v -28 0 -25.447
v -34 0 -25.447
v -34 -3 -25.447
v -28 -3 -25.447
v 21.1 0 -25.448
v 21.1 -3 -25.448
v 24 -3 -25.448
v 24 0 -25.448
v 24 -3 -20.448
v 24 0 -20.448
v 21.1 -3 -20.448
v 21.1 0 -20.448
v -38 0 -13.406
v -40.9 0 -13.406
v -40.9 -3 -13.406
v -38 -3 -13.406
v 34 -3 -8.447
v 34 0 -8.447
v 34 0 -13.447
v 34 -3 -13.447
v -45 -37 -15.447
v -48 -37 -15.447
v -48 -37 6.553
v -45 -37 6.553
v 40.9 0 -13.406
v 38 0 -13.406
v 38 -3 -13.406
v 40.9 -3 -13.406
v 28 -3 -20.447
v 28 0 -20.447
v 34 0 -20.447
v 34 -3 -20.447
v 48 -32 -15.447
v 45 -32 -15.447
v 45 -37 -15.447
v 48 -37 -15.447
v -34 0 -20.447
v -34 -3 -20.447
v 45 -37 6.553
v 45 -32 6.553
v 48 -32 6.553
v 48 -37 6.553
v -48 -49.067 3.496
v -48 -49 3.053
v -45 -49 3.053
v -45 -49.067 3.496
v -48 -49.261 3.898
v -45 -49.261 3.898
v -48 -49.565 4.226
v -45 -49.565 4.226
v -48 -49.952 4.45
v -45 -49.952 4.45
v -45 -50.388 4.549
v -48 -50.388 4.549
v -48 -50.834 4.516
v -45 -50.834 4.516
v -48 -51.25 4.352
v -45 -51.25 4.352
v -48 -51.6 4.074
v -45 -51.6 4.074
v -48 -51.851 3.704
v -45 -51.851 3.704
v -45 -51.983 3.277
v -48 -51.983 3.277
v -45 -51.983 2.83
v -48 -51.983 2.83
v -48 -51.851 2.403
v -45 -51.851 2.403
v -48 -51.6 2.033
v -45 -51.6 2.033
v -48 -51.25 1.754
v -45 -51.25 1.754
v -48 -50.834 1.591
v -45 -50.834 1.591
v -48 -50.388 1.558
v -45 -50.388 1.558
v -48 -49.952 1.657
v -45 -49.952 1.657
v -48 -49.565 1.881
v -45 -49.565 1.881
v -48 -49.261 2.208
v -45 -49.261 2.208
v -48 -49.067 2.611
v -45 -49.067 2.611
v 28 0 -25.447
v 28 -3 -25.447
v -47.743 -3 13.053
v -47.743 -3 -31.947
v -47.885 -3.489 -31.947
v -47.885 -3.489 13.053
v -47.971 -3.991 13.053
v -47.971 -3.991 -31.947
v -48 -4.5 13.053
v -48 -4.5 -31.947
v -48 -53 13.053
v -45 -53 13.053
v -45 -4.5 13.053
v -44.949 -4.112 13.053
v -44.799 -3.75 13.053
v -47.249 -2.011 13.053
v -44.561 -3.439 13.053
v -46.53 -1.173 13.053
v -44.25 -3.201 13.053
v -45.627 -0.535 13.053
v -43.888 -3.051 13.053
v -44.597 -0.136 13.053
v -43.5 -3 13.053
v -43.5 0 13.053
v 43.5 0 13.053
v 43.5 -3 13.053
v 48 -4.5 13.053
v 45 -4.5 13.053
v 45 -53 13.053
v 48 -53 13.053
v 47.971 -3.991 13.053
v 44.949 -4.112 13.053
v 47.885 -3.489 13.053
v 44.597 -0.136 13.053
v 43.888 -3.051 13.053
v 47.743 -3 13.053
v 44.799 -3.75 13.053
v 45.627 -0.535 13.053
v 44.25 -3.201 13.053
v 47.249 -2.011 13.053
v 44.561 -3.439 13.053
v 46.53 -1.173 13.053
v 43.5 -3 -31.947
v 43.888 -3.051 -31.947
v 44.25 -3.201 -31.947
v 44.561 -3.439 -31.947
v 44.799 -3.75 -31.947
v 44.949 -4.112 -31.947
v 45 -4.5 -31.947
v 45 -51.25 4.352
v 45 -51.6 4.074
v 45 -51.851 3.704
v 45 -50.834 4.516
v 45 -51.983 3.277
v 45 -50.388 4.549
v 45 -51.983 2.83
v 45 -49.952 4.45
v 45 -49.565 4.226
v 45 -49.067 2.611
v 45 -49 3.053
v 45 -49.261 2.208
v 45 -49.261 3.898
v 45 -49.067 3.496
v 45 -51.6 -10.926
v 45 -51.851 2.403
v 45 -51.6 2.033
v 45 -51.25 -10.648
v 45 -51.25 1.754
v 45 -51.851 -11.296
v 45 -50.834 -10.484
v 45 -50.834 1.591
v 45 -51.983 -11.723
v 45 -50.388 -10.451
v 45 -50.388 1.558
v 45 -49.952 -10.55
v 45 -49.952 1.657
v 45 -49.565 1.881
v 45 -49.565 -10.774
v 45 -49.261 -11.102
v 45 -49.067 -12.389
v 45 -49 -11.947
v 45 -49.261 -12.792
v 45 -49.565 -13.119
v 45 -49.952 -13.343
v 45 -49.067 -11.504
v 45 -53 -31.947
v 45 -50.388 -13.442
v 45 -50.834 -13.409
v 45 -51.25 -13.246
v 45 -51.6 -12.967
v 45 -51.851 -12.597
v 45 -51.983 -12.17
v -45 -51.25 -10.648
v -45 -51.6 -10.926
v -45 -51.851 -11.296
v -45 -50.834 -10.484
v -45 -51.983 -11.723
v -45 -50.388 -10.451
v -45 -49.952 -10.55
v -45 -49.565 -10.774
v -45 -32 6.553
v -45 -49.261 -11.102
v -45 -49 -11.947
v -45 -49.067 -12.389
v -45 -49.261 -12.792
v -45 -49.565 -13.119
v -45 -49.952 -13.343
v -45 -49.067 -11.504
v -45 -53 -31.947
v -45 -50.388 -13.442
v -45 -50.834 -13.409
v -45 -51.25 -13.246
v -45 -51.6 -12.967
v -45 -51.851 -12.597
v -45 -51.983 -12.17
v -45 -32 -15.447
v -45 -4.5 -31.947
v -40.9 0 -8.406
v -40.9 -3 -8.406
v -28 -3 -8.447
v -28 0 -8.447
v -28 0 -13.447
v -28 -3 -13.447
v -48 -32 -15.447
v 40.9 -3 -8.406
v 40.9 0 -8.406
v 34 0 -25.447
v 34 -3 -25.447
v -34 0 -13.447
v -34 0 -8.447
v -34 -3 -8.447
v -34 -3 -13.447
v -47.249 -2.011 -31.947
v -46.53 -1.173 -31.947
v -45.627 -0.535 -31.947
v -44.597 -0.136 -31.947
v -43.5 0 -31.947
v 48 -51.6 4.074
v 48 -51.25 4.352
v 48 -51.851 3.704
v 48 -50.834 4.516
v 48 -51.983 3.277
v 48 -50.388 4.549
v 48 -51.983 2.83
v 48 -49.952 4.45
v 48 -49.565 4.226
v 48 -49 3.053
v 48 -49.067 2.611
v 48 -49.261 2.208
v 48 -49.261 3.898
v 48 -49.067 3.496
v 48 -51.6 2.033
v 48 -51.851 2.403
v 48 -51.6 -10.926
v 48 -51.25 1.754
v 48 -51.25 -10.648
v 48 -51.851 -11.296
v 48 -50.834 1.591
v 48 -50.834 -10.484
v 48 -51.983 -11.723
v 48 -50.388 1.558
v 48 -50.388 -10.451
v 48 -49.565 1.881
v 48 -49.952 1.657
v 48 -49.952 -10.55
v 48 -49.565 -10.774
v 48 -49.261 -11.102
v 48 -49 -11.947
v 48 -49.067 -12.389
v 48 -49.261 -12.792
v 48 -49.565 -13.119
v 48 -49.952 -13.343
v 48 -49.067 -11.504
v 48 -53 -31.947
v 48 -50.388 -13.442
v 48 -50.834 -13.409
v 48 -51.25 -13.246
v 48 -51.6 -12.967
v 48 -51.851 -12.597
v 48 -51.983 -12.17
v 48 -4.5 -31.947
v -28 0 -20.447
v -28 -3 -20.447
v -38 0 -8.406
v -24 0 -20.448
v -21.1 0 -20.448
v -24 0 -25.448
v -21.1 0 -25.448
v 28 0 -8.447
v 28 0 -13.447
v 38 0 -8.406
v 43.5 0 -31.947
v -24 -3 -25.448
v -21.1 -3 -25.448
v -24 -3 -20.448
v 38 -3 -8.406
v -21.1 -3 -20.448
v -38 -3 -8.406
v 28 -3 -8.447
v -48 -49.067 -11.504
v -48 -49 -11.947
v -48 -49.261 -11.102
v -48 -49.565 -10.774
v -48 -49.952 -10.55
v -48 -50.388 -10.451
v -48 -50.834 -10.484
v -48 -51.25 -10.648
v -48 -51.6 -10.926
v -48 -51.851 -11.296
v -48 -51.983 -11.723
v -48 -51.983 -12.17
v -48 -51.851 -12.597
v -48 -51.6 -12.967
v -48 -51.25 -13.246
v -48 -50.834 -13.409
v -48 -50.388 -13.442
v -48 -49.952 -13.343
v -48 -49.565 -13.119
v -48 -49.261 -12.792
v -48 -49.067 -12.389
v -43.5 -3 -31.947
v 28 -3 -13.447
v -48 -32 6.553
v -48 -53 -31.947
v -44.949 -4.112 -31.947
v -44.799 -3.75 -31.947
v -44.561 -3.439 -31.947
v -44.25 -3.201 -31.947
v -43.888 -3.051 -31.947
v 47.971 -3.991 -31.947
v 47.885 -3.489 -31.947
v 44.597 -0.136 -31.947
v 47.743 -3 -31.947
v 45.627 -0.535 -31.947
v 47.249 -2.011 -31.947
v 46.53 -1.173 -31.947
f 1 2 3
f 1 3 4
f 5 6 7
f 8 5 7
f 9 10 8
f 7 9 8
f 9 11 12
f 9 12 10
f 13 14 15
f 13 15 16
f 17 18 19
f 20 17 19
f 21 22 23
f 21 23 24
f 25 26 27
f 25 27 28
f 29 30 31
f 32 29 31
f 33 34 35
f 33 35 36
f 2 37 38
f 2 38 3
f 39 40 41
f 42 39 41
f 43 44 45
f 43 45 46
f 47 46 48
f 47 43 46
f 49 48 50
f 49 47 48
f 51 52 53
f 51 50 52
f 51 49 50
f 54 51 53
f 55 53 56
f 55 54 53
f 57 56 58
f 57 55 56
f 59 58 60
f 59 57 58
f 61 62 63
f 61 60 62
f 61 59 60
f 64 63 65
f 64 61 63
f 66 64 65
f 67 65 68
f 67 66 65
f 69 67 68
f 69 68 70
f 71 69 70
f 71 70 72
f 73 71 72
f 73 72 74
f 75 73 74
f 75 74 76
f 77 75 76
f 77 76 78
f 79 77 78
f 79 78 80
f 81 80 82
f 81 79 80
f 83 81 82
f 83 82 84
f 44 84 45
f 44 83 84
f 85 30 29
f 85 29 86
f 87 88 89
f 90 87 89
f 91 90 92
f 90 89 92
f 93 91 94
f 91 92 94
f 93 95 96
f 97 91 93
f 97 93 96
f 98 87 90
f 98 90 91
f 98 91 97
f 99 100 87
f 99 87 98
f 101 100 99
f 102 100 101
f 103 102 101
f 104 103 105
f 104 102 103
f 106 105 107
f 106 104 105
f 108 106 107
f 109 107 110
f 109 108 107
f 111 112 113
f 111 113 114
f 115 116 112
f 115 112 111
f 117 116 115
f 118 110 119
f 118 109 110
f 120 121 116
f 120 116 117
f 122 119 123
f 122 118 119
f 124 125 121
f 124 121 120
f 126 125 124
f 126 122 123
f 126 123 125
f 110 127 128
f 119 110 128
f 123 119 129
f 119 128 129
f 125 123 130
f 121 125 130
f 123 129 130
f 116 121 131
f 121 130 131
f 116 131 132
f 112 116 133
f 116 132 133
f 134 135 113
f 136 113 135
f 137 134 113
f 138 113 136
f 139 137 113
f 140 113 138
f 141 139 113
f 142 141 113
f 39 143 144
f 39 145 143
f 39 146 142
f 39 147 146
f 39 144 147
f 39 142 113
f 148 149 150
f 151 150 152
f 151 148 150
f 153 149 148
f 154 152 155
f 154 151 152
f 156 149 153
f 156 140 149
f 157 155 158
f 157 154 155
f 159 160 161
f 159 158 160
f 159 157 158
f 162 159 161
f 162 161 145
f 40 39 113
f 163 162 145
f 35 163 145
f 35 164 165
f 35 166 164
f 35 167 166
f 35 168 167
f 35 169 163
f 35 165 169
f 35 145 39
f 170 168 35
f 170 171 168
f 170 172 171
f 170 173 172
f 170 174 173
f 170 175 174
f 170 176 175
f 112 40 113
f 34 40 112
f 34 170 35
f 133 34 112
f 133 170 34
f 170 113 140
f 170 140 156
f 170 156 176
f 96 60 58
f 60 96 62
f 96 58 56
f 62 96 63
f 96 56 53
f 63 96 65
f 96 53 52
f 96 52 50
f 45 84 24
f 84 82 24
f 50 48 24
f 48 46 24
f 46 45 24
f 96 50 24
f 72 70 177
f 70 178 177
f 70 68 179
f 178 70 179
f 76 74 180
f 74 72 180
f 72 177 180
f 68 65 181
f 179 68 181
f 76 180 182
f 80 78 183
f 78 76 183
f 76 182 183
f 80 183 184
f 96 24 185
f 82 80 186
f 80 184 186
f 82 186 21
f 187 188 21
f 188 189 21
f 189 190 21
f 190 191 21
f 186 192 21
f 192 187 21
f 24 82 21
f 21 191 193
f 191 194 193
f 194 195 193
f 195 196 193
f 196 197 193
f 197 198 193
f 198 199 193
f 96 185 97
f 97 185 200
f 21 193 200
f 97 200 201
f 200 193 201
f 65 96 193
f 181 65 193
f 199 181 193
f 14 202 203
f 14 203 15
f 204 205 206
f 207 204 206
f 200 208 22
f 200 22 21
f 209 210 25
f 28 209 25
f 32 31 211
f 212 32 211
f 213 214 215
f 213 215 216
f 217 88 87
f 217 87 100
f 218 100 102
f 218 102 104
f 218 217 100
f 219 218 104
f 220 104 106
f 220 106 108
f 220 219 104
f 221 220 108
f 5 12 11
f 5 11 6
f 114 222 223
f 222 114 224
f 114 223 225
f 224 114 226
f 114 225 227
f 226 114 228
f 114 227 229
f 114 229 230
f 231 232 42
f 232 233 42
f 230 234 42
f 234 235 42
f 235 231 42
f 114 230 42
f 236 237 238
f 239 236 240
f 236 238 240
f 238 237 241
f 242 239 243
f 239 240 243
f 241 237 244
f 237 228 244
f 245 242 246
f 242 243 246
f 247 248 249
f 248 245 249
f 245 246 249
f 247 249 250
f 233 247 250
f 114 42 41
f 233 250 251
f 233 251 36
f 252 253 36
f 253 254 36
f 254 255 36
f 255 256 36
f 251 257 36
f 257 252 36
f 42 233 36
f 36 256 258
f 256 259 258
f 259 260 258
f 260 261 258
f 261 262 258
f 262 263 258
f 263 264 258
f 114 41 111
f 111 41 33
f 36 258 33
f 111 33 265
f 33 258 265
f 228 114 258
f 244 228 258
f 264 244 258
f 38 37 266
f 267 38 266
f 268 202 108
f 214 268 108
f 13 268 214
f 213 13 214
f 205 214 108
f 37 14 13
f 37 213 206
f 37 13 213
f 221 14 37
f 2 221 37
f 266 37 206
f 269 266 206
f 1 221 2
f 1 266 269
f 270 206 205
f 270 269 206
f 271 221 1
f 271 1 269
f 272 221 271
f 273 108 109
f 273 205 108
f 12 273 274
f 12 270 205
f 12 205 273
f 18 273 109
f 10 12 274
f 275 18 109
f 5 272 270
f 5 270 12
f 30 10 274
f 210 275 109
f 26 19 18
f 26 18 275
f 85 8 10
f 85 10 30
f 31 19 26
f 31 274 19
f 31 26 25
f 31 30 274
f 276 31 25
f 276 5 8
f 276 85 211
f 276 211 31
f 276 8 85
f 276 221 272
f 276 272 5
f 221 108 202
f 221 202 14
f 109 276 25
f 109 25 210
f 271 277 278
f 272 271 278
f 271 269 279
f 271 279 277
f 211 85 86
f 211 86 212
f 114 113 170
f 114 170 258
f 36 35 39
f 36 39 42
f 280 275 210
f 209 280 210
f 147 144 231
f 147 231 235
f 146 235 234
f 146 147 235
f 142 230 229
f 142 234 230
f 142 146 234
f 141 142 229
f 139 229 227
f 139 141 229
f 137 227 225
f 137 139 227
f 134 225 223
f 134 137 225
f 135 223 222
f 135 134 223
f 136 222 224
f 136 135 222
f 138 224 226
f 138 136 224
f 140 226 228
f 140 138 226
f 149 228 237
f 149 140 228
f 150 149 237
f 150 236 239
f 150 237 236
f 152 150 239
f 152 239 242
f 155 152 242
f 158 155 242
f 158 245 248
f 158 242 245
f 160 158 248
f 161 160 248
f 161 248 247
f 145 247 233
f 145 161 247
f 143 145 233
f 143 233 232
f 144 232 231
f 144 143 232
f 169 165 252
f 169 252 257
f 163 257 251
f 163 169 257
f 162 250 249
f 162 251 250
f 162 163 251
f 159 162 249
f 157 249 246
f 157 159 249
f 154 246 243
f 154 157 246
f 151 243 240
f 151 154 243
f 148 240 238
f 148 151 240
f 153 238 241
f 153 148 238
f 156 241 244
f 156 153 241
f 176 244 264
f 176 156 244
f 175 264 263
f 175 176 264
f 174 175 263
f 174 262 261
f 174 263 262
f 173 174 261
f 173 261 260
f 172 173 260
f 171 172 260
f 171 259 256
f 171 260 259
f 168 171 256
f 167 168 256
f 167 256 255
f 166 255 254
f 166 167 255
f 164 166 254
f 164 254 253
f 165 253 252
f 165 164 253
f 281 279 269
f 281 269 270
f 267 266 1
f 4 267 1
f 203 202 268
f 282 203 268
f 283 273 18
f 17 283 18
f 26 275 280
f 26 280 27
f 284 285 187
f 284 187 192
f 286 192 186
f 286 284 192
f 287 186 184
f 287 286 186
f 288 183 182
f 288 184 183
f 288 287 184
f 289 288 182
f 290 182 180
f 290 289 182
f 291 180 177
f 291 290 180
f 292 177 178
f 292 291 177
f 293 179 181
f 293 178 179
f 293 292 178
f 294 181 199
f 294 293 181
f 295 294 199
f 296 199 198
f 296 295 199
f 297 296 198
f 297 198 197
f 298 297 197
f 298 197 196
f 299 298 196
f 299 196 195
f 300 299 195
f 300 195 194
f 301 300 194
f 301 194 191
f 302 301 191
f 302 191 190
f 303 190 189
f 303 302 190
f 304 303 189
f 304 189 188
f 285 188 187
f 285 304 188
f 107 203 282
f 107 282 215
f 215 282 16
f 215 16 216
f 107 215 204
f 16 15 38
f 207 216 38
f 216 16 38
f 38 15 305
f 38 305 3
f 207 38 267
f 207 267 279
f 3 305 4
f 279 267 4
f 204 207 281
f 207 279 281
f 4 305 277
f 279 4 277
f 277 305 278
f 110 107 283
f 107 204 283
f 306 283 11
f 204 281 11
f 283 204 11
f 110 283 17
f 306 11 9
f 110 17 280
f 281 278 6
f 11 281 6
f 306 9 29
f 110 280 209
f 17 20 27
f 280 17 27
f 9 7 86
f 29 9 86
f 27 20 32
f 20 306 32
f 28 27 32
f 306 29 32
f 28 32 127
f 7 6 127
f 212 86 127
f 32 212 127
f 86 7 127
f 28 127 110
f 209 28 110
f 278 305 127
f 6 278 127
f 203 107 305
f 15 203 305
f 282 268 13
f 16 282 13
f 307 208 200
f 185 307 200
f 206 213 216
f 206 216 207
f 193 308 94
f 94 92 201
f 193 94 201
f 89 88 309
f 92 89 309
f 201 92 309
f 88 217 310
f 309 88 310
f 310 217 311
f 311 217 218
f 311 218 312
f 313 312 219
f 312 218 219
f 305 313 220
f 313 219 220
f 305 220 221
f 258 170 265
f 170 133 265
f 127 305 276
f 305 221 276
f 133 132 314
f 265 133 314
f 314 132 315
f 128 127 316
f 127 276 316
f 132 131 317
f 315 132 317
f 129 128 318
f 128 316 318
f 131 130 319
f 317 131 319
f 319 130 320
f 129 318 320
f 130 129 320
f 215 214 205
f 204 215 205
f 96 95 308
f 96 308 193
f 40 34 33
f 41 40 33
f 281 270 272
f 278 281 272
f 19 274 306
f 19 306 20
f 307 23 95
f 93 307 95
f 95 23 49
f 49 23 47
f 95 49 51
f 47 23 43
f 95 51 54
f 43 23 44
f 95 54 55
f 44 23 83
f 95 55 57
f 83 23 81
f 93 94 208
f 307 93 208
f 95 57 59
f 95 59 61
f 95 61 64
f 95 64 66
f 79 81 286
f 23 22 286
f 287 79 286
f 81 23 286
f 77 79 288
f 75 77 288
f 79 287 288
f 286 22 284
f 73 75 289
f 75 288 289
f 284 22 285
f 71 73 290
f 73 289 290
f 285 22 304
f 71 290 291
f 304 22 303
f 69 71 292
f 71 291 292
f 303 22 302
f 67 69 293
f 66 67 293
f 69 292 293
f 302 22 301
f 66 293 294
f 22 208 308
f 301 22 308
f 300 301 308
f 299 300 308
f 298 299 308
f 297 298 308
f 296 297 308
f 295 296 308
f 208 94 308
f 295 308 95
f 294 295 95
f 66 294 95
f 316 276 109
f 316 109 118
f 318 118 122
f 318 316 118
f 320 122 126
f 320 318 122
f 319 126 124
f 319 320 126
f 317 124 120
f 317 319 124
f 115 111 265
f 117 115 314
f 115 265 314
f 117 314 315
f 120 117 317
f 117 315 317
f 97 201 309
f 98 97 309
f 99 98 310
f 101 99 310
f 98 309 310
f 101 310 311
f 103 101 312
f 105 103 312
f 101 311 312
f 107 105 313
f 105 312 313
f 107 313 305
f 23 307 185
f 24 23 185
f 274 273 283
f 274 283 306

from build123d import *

# Parameters (mm, degrees)
SKETCH1_R                  = 1.5
SKETCH1_W                  = 2.9
SKETCH1_H                  = 5
SKETCH1_W_2                = 6
SKETCH1_W_3                = 5
SKETCH1_H_2                = 22
BASE_FLANGE1_DEPTH         = 3
SKETCHED_START             = -31.946571622
SKETCHED_BEND1_DEPTH       = 45
SKETCHED_BEND1_2_OUTLINE_W = 3
SKETCHED_BEND1_2_OUTLINE_H = 16
SKETCHED_BEND1_2_DEPTH     = 45
SKETCHED_BEND1_3_OUTLINE_W = 3
SKETCHED_BEND1_3_OUTLINE_H = 5
SKETCHED_BEND1_3_DEPTH     = 16.5
SKETCHED_START_2           = 6.553428378
SKETCHED_BEND1_4_OUTLINE_W = 3
SKETCHED_BEND1_4_OUTLINE_H = 5
SKETCHED_BEND1_4_DEPTH     = 6.5
SKETCHED_START_3           = -49
SKETCHED_BEND1_5_OUTLINE_R = 1.5
SKETCHED_BEND1_5_DEPTH     = 98


with BuildPart() as part:
    # Base-Flange1: sheet metal written as solids
    # Sketch1 → Base-Flange1 (new body)
    with BuildSketch(Plane(origin=(0, 0, 0), x_dir=(1, 0, 0), z_dir=(0, 1, 0))):
        Polygon((-95, 31.946571622), (-95, -13.053428378), (95, -13.053428378), (95, 31.946571622), (45, 31.946571622), (-45, 31.946571622), align=None)
        with Locations(Location((92.5, -3.053428378, 0), (0, 0, 270))):
            Circle(SKETCH1_R, mode=Mode.SUBTRACT)
        with Locations(Location((92.5, 11.946571622, 0), (0, 0, 270))):
            Circle(SKETCH1_R, mode=Mode.SUBTRACT)
        with Locations(Location((-92.5, -3.053428378, 0), (0, 0, 90))):
            Circle(SKETCH1_R, mode=Mode.SUBTRACT)
        with Locations(Location((-92.5, 11.946571622, 0), (0, 0, 90))):
            Circle(SKETCH1_R, mode=Mode.SUBTRACT)
        with Locations((-39.45, 10.905641405)):
            Rectangle(SKETCH1_W, SKETCH1_H, mode=Mode.SUBTRACT)
        with Locations((-22.55, 22.947848405)):
            Rectangle(SKETCH1_W, SKETCH1_H, mode=Mode.SUBTRACT)
        with Locations((-31, 22.946571622)):
            Rectangle(SKETCH1_W_2, SKETCH1_H, mode=Mode.SUBTRACT)
        with Locations((-31, 10.946571622)):
            Rectangle(SKETCH1_W_2, SKETCH1_H, mode=Mode.SUBTRACT)
        with Locations((31, 10.946571622)):
            Rectangle(SKETCH1_W_2, SKETCH1_H, mode=Mode.SUBTRACT)
        with Locations((31, 22.946571622)):
            Rectangle(SKETCH1_W_2, SKETCH1_H, mode=Mode.SUBTRACT)
        with Locations((22.55, 22.947848405)):
            Rectangle(SKETCH1_W, SKETCH1_H, mode=Mode.SUBTRACT)
        with Locations((39.45, 10.905641405)):
            Rectangle(SKETCH1_W, SKETCH1_H, mode=Mode.SUBTRACT)
        with Locations((76.5, 4.446571622)):
            Rectangle(SKETCH1_W_3, SKETCH1_H_2, mode=Mode.SUBTRACT)
        with Locations((-76.5, 4.446571622)):
            Rectangle(SKETCH1_W_3, SKETCH1_H_2, mode=Mode.SUBTRACT)
    extrude(amount=-BASE_FLANGE1_DEPTH)

    # Sketched Bend1: read off the stored shape, not the designer's step
    # Sketched Bend1 outline → Sketched Bend1 (cut)
    with BuildSketch(Plane.XY.offset(SKETCHED_START)):
        with BuildLine():
            ThreePointArc((43.5, 0), (46.098076211, -0.825765386), (47.742640687, -3))
            Line((47.742640687, -3), (95, -3))
            Line((95, -3), (95, 0))
            Line((95, 0), (43.5, 0))
        make_face()
        with BuildLine():
            ThreePointArc((-47.742640687, -3), (-46.098076211, -0.825765386), (-43.5, 0))
            Line((-43.5, 0), (-95, 0))
            Line((-95, 0), (-95, -3))
            Line((-95, -3), (-47.742640687, -3))
        make_face()
    extrude(amount=SKETCHED_BEND1_DEPTH, mode=Mode.SUBTRACT)

    # Sketched Bend1 2 outline → Sketched Bend1 2 (add)
    with BuildSketch(Plane.XY.offset(SKETCHED_START)):
        with BuildLine():
            ThreePointArc((43.5, -3), (44.560660172, -3.439339828), (45, -4.5))
            Line((45, -4.5), (45, -32))
            Line((45, -32), (48, -32))
            Line((48, -32), (48, -4.5))
            ThreePointArc((48, -4.5), (47.935193518, -3.739041096), (47.742640687, -3))
            Line((47.742640687, -3), (43.5, -3))
        make_face()
        with BuildLine():
            ThreePointArc((-45, -4.5), (-44.560660172, -3.439339828), (-43.5, -3))
            Line((-43.5, -3), (-47.742640687, -3))
            ThreePointArc((-47.742640687, -3), (-47.935193518, -3.739041096), (-48, -4.5))
            Line((-48, -4.5), (-48, -32))
            Line((-48, -32), (-45, -32))
            Line((-45, -32), (-45, -4.5))
        make_face()
        with Locations((46.5, -45)):
            Rectangle(SKETCHED_BEND1_2_OUTLINE_W, SKETCHED_BEND1_2_OUTLINE_H)
        with Locations((-46.5, -45)):
            Rectangle(SKETCHED_BEND1_2_OUTLINE_W, SKETCHED_BEND1_2_OUTLINE_H)
    extrude(amount=SKETCHED_BEND1_2_DEPTH)

    # Sketched Bend1 3 outline → Sketched Bend1 3 (add)
    with BuildSketch(Plane.XY.offset(SKETCHED_START)):
        with Locations((46.5, -34.5)):
            Rectangle(SKETCHED_BEND1_3_OUTLINE_W, SKETCHED_BEND1_3_OUTLINE_H)
        with Locations((-46.5, -34.5)):
            Rectangle(SKETCHED_BEND1_3_OUTLINE_W, SKETCHED_BEND1_3_OUTLINE_H)
    extrude(amount=SKETCHED_BEND1_3_DEPTH)

    # Sketched Bend1 4 outline → Sketched Bend1 4 (add)
    with BuildSketch(Plane.XY.offset(SKETCHED_START_2)):
        with Locations((46.5, -34.5)):
            Rectangle(SKETCHED_BEND1_4_OUTLINE_W, SKETCHED_BEND1_4_OUTLINE_H)
        with Locations((-46.5, -34.5)):
            Rectangle(SKETCHED_BEND1_4_OUTLINE_W, SKETCHED_BEND1_4_OUTLINE_H)
    extrude(amount=SKETCHED_BEND1_4_DEPTH)

    # Sketched Bend1 5 outline → Sketched Bend1 5 (cut)
    with BuildSketch(Plane.YZ.offset(SKETCHED_START_3)):
        with Locations((-50.5, -11.946571622)):
            Circle(SKETCHED_BEND1_5_OUTLINE_R)
        with Locations((-50.5, 3.053428378)):
            Circle(SKETCHED_BEND1_5_OUTLINE_R)
    extrude(amount=SKETCHED_BEND1_5_DEPTH, mode=Mode.SUBTRACT)


solid = part.part
